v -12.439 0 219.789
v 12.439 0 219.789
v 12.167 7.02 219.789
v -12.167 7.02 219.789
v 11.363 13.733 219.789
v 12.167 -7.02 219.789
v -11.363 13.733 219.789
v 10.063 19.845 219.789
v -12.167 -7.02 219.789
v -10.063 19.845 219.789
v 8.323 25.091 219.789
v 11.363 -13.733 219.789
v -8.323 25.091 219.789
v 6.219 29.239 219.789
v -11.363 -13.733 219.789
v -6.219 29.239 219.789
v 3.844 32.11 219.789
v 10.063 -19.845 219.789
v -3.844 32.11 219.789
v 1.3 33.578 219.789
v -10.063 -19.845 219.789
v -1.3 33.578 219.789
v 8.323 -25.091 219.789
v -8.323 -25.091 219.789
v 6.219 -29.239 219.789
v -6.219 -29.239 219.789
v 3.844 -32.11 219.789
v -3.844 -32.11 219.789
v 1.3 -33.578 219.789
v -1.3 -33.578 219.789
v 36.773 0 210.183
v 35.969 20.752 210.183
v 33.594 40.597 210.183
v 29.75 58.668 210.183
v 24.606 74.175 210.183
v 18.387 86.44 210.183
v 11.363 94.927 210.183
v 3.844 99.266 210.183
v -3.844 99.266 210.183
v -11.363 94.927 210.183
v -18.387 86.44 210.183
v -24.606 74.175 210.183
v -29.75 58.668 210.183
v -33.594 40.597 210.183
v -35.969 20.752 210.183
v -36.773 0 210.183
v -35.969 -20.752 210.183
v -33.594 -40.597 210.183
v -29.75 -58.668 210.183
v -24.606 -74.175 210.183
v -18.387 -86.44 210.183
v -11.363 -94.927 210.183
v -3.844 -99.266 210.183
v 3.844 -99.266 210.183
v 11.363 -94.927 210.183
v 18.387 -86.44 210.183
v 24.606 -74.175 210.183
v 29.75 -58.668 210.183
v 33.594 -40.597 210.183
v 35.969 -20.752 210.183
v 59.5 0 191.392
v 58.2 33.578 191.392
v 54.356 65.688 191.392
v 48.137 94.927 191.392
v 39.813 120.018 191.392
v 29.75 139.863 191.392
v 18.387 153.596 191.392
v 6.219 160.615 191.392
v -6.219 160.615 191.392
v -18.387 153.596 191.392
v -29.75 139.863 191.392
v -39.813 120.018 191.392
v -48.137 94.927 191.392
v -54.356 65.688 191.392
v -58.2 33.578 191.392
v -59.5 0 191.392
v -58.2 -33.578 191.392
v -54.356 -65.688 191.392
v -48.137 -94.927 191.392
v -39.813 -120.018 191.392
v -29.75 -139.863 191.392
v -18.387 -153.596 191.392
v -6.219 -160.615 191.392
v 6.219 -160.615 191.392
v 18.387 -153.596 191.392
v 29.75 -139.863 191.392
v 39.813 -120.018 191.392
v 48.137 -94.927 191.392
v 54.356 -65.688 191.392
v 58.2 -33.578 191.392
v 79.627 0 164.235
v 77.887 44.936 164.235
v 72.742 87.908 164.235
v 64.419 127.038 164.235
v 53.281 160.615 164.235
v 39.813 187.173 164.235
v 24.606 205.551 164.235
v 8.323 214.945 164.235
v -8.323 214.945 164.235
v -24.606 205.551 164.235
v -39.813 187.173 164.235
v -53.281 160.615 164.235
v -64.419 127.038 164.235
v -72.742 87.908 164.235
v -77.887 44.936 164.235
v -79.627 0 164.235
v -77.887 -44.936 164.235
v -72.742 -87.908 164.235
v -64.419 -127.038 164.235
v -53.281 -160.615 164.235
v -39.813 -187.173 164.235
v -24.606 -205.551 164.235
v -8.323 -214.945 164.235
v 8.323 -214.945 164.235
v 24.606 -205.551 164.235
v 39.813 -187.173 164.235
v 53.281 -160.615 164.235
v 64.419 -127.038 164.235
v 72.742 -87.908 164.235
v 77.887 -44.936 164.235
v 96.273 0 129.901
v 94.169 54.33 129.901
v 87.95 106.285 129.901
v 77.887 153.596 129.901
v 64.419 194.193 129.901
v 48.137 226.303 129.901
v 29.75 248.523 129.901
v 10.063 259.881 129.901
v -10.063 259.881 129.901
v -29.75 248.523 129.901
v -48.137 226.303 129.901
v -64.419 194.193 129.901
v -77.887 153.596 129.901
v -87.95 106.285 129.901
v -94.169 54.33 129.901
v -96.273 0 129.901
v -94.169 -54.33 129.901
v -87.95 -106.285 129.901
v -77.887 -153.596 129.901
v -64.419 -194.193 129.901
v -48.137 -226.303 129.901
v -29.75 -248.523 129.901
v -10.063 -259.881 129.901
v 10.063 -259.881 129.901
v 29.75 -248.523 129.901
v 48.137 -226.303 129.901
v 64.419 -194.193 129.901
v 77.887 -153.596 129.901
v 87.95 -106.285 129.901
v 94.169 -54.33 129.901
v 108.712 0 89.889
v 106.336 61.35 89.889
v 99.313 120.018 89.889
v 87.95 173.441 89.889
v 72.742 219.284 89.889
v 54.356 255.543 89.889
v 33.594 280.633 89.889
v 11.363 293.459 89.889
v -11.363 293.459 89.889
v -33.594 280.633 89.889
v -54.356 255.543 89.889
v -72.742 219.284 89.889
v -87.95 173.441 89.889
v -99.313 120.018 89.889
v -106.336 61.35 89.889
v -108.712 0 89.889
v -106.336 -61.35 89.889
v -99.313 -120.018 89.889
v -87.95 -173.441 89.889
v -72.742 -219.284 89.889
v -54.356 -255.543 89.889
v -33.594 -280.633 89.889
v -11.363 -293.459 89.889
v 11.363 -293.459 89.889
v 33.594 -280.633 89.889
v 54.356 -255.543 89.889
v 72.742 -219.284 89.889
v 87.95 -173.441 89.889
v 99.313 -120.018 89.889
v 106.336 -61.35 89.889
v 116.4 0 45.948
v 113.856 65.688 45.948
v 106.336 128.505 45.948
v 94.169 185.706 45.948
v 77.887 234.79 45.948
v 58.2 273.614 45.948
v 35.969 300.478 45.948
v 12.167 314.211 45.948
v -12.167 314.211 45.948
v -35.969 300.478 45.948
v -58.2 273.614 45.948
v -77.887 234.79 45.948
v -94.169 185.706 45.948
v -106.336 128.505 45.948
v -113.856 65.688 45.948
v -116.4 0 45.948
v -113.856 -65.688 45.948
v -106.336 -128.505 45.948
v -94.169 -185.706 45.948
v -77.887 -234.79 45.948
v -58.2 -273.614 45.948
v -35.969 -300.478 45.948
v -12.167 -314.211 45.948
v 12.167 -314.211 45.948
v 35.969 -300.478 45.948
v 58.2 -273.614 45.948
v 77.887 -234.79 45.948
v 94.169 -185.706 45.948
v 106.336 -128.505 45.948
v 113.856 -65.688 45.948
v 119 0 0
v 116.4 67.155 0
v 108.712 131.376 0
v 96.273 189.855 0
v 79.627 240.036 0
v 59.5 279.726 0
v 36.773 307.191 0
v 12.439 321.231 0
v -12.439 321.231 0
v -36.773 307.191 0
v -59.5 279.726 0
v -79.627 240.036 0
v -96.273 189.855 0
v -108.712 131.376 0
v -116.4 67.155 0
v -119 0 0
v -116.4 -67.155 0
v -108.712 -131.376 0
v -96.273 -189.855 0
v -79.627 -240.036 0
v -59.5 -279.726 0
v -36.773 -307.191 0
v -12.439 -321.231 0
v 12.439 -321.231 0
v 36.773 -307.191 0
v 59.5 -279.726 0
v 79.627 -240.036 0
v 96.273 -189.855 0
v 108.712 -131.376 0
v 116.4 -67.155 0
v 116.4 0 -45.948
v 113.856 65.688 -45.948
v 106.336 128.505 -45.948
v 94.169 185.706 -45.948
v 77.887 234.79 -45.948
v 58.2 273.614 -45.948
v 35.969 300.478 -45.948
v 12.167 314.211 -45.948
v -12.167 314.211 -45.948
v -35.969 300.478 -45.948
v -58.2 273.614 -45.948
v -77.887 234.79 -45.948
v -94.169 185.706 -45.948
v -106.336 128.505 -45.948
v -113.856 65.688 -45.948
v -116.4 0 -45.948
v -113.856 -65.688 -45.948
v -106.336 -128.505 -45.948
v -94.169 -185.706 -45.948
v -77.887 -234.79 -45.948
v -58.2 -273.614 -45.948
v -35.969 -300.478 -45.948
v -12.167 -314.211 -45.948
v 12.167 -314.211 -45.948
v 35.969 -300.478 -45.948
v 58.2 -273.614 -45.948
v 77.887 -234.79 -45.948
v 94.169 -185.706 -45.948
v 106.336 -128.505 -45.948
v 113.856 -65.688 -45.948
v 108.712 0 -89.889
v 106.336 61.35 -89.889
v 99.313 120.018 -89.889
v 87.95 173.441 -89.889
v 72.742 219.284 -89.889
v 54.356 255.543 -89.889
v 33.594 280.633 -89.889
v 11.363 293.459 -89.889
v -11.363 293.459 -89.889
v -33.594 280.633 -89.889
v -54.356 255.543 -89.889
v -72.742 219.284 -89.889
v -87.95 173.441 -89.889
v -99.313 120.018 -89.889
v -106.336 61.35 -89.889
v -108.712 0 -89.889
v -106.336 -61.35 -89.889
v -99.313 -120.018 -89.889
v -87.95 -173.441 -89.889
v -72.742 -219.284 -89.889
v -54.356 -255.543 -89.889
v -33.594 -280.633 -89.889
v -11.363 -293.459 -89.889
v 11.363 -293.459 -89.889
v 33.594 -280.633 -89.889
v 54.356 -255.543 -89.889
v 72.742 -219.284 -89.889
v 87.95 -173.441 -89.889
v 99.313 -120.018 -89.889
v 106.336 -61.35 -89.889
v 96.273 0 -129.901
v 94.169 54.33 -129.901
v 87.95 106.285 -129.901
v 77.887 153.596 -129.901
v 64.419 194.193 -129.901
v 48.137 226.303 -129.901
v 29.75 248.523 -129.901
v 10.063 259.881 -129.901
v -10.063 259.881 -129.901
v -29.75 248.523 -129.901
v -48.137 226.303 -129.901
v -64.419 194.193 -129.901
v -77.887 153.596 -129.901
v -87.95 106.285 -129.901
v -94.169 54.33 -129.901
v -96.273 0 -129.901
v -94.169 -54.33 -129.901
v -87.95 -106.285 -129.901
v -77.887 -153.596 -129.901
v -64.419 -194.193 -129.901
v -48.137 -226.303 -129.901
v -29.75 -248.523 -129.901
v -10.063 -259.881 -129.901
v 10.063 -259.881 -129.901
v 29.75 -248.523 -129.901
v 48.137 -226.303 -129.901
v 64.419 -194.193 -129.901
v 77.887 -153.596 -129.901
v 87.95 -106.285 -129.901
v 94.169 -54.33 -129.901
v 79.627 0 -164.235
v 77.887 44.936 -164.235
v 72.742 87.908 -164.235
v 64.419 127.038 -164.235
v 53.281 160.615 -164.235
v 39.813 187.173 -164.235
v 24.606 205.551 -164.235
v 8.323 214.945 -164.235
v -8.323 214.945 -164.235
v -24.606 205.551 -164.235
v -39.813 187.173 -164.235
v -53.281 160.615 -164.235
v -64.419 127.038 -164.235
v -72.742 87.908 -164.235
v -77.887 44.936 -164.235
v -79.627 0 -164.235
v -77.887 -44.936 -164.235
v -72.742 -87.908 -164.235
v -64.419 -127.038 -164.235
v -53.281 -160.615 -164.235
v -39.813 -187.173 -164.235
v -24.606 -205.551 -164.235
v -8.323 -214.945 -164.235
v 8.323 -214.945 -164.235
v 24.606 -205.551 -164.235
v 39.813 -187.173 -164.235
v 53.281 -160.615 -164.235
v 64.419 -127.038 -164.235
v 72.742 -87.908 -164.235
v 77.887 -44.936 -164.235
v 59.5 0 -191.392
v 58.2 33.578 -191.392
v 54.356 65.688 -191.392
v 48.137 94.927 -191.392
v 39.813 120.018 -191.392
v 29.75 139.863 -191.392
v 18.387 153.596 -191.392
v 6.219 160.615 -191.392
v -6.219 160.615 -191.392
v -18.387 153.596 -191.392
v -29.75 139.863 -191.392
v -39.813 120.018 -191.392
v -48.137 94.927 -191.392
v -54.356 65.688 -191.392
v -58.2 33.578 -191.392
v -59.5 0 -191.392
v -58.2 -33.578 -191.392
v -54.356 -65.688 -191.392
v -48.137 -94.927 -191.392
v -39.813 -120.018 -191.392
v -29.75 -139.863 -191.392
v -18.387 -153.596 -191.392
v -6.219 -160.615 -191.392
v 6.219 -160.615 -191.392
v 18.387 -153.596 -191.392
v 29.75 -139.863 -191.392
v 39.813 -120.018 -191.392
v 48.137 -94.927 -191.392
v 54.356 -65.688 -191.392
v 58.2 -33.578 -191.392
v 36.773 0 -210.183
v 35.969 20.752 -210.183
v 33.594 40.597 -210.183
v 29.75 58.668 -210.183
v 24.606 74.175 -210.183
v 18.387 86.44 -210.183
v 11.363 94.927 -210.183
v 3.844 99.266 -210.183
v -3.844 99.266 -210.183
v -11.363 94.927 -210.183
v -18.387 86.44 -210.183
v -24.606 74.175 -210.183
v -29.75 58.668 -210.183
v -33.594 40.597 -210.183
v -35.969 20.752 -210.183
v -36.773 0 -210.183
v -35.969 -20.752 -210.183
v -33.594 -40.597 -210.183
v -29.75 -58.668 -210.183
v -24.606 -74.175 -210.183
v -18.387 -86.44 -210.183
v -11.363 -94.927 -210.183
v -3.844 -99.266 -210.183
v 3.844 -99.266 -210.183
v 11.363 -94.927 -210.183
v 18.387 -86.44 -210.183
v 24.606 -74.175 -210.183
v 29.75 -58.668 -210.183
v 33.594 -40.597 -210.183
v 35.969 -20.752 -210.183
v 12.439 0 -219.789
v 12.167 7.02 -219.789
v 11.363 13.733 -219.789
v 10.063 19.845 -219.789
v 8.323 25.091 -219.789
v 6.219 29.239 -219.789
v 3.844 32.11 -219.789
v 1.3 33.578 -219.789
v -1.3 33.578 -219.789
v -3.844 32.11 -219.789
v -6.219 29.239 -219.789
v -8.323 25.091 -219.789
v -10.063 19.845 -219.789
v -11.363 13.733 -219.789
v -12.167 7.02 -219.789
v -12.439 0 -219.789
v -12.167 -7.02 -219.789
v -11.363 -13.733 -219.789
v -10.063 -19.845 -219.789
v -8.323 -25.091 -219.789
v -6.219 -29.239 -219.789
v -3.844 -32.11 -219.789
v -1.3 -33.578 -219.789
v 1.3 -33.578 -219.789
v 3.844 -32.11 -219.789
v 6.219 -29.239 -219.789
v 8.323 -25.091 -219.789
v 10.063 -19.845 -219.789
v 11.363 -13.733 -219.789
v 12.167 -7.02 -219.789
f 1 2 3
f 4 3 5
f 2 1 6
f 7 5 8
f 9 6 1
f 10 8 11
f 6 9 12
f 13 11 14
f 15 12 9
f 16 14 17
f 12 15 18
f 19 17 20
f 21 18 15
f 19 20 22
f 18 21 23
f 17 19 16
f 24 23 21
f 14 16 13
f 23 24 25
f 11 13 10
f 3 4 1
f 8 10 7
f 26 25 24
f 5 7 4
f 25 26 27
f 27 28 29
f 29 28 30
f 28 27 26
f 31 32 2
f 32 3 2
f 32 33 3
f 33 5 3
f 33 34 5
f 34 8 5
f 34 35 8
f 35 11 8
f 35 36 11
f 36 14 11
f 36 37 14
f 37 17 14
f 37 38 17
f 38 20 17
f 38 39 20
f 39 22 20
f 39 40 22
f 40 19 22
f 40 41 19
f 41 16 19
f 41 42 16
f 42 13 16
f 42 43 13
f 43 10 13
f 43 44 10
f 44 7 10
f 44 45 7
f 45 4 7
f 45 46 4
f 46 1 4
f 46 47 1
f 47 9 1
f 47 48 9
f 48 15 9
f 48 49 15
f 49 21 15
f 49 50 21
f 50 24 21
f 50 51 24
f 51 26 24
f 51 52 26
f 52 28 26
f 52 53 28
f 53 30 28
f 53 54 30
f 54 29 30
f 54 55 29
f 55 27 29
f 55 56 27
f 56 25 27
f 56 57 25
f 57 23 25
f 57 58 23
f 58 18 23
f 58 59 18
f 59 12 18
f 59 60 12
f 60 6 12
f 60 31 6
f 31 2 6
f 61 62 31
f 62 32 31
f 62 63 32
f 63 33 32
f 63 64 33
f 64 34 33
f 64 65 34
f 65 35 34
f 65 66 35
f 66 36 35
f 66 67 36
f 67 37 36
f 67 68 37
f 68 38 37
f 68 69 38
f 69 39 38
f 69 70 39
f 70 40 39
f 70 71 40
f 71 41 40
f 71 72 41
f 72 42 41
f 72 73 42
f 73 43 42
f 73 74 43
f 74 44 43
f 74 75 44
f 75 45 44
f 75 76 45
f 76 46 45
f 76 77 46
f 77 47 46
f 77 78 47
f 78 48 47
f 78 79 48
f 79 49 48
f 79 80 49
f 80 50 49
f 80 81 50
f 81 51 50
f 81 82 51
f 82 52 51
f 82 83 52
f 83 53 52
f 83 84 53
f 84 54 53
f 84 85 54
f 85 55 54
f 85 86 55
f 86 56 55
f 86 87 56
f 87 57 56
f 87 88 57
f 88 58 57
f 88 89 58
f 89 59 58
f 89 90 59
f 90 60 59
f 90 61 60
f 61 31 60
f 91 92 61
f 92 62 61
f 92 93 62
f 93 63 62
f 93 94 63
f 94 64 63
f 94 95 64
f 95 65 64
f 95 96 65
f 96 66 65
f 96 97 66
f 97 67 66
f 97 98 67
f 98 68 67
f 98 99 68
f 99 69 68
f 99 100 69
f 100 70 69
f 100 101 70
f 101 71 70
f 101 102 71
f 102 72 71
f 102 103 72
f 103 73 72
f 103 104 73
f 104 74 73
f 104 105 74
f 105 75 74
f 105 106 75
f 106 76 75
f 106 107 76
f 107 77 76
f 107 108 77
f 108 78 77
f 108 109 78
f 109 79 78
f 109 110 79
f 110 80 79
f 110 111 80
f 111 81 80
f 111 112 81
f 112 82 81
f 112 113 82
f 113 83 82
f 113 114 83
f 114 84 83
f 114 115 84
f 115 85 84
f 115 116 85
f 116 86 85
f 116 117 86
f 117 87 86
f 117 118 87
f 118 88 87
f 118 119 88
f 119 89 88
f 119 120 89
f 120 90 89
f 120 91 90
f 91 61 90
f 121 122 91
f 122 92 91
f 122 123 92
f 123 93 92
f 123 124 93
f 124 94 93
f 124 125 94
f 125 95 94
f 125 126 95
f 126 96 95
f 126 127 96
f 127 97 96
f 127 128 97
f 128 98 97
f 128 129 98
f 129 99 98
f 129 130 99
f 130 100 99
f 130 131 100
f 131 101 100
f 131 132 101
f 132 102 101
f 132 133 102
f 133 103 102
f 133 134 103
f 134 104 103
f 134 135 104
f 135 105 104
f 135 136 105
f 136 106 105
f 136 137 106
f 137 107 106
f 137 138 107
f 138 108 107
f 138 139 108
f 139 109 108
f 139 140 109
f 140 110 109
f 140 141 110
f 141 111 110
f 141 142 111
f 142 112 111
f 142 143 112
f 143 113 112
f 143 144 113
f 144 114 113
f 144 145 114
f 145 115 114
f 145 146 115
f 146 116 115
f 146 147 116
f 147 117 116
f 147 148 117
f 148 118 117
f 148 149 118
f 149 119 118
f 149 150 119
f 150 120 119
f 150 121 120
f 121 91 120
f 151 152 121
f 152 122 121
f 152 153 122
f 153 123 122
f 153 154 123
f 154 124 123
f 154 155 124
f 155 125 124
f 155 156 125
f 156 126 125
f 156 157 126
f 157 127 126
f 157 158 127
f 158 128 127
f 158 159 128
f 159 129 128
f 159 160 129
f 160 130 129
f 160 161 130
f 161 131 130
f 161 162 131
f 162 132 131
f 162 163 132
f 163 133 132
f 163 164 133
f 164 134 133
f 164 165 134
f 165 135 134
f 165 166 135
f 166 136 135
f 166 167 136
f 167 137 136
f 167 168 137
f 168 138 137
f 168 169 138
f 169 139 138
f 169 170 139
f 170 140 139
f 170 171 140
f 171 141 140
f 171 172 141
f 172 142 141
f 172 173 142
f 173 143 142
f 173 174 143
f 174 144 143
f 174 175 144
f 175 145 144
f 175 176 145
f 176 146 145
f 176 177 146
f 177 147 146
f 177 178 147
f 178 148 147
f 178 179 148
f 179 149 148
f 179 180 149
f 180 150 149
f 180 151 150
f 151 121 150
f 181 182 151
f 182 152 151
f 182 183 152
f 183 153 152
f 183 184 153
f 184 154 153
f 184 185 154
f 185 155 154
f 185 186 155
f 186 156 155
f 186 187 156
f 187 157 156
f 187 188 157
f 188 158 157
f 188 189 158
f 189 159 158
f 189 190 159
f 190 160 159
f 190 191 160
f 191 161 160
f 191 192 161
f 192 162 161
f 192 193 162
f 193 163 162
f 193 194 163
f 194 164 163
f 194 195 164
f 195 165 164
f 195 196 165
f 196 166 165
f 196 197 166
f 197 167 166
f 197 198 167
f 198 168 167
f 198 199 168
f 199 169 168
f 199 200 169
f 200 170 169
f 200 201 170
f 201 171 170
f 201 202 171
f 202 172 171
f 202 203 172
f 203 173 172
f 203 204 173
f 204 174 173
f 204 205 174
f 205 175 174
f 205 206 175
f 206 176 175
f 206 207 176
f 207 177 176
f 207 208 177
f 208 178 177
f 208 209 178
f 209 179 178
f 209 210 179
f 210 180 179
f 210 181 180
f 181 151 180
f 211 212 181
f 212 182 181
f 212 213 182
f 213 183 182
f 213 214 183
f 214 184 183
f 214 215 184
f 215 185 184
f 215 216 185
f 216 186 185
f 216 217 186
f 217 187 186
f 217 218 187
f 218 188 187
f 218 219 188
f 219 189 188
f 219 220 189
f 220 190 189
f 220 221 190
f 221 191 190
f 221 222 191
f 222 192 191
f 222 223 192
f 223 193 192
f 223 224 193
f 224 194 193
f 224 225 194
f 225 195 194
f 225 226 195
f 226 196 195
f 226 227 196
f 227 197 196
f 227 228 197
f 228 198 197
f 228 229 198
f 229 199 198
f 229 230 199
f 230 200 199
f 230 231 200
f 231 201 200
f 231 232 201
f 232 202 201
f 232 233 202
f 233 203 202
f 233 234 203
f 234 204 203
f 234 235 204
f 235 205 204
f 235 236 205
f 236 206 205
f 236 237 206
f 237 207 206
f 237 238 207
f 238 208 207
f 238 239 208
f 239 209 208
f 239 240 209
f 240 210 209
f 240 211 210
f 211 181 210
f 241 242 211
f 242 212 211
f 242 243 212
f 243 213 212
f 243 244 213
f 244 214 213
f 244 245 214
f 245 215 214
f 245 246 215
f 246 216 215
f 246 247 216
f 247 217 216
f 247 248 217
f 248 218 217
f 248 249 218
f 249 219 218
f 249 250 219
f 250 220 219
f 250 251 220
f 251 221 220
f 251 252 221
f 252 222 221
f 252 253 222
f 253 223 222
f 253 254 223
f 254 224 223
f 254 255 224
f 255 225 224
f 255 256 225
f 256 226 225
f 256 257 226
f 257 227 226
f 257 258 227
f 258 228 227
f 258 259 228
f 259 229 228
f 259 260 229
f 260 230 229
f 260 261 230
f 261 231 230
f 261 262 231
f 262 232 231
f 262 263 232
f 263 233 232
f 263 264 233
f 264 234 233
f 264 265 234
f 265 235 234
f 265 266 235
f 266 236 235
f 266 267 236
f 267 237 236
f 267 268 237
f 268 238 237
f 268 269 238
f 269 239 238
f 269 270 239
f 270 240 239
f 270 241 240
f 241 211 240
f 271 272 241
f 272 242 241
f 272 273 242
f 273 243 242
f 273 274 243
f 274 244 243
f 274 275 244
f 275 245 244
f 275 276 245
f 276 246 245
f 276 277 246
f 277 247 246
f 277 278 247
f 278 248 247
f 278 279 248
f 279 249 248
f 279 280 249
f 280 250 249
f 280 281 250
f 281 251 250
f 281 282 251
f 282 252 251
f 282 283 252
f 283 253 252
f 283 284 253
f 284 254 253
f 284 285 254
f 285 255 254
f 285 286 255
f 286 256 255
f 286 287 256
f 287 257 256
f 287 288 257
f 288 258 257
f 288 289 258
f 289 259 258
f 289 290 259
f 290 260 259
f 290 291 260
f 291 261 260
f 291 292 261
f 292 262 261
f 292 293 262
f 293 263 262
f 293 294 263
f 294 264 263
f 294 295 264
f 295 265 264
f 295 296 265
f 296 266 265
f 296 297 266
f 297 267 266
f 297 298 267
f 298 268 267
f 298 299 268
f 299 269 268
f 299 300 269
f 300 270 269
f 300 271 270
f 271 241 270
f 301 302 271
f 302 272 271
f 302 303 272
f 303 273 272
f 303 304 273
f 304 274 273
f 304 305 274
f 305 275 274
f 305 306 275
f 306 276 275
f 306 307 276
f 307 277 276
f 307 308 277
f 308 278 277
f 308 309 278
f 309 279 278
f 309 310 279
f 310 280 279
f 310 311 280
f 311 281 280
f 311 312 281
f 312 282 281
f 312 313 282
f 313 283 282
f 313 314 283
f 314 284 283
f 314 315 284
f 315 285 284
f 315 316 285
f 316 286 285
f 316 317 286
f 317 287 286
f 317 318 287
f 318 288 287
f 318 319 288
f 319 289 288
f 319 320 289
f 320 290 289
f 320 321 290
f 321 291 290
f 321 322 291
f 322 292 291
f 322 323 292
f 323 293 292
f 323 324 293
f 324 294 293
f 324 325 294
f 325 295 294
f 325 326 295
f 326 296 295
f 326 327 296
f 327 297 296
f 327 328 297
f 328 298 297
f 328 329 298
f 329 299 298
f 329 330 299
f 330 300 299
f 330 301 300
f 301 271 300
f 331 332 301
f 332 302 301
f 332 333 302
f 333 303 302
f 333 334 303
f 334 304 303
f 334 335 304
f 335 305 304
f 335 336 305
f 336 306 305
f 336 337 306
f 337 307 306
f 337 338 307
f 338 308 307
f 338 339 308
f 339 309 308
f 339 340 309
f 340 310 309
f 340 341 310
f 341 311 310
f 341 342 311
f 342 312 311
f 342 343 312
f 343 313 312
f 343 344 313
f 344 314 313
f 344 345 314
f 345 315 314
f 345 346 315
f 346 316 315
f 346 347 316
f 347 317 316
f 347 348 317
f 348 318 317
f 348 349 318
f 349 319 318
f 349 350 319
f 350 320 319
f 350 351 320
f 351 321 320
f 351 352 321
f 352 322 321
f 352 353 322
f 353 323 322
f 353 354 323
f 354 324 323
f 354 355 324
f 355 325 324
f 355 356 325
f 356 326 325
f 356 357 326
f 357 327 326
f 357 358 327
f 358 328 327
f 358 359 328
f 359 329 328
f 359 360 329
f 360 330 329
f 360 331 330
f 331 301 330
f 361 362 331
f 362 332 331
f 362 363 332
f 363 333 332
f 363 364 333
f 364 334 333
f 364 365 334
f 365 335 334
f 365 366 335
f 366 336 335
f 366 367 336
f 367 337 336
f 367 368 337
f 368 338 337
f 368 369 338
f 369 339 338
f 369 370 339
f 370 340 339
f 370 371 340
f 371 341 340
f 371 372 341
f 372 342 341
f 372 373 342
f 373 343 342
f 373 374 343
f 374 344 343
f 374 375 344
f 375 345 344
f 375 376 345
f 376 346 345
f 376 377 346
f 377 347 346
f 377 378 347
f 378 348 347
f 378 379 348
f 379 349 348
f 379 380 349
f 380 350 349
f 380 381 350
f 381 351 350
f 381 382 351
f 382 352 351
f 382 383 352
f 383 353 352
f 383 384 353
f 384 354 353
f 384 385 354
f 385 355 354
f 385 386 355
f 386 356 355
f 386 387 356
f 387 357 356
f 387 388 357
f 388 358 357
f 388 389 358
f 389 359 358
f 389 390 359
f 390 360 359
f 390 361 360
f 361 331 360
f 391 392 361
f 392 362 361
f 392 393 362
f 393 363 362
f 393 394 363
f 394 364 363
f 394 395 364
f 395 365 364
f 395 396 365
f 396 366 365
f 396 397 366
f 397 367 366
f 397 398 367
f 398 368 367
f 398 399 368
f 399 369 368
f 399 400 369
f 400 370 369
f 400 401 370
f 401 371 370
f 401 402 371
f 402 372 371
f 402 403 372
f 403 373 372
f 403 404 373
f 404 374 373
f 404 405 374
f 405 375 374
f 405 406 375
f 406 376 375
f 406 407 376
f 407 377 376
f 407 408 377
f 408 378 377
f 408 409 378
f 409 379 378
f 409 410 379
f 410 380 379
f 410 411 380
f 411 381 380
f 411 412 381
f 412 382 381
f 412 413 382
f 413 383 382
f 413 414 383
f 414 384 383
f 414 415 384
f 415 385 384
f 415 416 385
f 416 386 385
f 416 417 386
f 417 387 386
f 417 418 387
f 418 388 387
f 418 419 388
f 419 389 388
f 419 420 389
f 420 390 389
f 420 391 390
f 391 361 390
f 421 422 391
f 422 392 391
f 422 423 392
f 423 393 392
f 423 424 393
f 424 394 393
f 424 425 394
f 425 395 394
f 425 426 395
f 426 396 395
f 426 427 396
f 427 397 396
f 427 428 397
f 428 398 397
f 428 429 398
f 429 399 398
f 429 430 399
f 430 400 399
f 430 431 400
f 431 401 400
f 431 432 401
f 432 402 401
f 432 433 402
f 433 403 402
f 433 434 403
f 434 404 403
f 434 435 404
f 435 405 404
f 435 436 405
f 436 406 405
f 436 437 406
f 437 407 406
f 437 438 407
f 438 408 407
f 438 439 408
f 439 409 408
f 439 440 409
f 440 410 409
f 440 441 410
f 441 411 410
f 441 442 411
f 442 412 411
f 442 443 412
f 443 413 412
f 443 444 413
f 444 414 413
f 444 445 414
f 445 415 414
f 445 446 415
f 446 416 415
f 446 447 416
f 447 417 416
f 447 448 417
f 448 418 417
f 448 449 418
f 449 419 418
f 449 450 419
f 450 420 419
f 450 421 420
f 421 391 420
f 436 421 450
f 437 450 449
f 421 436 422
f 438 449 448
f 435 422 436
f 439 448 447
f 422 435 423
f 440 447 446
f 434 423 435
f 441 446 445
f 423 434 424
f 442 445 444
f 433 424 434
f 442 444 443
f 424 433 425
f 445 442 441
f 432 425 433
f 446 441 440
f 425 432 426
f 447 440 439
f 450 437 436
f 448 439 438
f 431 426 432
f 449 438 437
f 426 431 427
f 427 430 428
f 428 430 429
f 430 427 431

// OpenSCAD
// Generated by SolidPython 1.0.1 on 2020-07-29 00:46:48


scale(v = [7, 19, 13]) {
	sphere(r = 17);
}
/***********************************************
*********      SolidPython code:      **********
************************************************
 
# import packages: SolidPython
from solid import *
from solid.utils import *
from itertools import chain, combinations, permutations


class Resize:

    def __init__(self, scad_file):
        self.scad_file = scad_file
        #self.scad_file = import_scad(scad_file)
        # cone/cylinder param:
        self.r1 = 0
        self.r2 = 0
        self.h = 0
        # rectangular prism param:
        self.w = 0
        self.l = 0
        # ellipse param:
        self.r = 0

    # import OpenScad code (file name corresponds to shape)


    # classify shape + parameters
    def assign(self, param1, param2, param3):
        if self.scad_file == 'cone.scad':
            self.r1 = param1
            self.r2 = param2
            self.h = param3
        elif self.scad_file == 'cylinder.scad':
            self.r1 = param1
            self.r2 = param2
            self.h = param3
        elif self.scad_file == 'rectangularPrism.scad':
            self.h = param1
            self.l = param2
            self.w = param3
        else:
            self.r = param1
            self.h = param2

    # resize parameters
    def iterate(self):
        x = range(3, 20, 2)
        i = 1
        if self.scad_file == 'cone.scad':
            tempList = list(permutations(x, 2))
            for temp in tempList:
                param1 = temp[0]
                param2 = temp[1]
                filepath = 'produced_scad_files/' + 'cone' + str(param1) + '_' + str(param2) + '_' + '.scad'
                scad_render_to_file(cylinder(h=param1, r1=param2, r2=0), filepath)

        elif self.scad_file == 'cylinder.scad':
            tempList = list(permutations(x, 3))
            for temp in tempList:
                param1 = temp[0]
                param2 = temp[1]
                filepath = 'produced_scad_files/' + 'cylinder' + str(param1) + '_' + str(param2) + '_' + '.scad'
                scad_render_to_file(cylinder(h=param1, r1=param2, r2=param2), filepath)

        elif self.scad_file == 'rectangularPrism.scad':
            tempList = list(permutations(x, 3))
            for temp in tempList:
                param1 = temp[0]
                param2 = temp[1]
                param3 = temp[2]
                filepath = 'produced_scad_files/' + 'rectangularPrism' + str(param1) + '_' + str(param2) + '_' + str(
                    param3) + '.scad'
                scad_render_to_file(cube(size=(param1, param2, param3)), filepath)

        elif self.scad_file == 'ellipse.scad':
            tempList = list(permutations(x, 4))
            for temp in tempList:
                param1 = temp[0]
                param2 = temp[1]
                param3 = temp[2]
                param4 = temp[3]
                filepath = 'produced_scad_files/' + 'ellipse' + str(param1) + '_' + str(param2) + '_' + str(param3) + '_' + str(param4) + '.scad'
                scad_render_to_file(scale([param1, param2, param3])(sphere(r=param4)), filepath)

    def render_to_scadfile(self):
        scad_render_to_file(scad, 'example.scad') 
 
************************************************/
